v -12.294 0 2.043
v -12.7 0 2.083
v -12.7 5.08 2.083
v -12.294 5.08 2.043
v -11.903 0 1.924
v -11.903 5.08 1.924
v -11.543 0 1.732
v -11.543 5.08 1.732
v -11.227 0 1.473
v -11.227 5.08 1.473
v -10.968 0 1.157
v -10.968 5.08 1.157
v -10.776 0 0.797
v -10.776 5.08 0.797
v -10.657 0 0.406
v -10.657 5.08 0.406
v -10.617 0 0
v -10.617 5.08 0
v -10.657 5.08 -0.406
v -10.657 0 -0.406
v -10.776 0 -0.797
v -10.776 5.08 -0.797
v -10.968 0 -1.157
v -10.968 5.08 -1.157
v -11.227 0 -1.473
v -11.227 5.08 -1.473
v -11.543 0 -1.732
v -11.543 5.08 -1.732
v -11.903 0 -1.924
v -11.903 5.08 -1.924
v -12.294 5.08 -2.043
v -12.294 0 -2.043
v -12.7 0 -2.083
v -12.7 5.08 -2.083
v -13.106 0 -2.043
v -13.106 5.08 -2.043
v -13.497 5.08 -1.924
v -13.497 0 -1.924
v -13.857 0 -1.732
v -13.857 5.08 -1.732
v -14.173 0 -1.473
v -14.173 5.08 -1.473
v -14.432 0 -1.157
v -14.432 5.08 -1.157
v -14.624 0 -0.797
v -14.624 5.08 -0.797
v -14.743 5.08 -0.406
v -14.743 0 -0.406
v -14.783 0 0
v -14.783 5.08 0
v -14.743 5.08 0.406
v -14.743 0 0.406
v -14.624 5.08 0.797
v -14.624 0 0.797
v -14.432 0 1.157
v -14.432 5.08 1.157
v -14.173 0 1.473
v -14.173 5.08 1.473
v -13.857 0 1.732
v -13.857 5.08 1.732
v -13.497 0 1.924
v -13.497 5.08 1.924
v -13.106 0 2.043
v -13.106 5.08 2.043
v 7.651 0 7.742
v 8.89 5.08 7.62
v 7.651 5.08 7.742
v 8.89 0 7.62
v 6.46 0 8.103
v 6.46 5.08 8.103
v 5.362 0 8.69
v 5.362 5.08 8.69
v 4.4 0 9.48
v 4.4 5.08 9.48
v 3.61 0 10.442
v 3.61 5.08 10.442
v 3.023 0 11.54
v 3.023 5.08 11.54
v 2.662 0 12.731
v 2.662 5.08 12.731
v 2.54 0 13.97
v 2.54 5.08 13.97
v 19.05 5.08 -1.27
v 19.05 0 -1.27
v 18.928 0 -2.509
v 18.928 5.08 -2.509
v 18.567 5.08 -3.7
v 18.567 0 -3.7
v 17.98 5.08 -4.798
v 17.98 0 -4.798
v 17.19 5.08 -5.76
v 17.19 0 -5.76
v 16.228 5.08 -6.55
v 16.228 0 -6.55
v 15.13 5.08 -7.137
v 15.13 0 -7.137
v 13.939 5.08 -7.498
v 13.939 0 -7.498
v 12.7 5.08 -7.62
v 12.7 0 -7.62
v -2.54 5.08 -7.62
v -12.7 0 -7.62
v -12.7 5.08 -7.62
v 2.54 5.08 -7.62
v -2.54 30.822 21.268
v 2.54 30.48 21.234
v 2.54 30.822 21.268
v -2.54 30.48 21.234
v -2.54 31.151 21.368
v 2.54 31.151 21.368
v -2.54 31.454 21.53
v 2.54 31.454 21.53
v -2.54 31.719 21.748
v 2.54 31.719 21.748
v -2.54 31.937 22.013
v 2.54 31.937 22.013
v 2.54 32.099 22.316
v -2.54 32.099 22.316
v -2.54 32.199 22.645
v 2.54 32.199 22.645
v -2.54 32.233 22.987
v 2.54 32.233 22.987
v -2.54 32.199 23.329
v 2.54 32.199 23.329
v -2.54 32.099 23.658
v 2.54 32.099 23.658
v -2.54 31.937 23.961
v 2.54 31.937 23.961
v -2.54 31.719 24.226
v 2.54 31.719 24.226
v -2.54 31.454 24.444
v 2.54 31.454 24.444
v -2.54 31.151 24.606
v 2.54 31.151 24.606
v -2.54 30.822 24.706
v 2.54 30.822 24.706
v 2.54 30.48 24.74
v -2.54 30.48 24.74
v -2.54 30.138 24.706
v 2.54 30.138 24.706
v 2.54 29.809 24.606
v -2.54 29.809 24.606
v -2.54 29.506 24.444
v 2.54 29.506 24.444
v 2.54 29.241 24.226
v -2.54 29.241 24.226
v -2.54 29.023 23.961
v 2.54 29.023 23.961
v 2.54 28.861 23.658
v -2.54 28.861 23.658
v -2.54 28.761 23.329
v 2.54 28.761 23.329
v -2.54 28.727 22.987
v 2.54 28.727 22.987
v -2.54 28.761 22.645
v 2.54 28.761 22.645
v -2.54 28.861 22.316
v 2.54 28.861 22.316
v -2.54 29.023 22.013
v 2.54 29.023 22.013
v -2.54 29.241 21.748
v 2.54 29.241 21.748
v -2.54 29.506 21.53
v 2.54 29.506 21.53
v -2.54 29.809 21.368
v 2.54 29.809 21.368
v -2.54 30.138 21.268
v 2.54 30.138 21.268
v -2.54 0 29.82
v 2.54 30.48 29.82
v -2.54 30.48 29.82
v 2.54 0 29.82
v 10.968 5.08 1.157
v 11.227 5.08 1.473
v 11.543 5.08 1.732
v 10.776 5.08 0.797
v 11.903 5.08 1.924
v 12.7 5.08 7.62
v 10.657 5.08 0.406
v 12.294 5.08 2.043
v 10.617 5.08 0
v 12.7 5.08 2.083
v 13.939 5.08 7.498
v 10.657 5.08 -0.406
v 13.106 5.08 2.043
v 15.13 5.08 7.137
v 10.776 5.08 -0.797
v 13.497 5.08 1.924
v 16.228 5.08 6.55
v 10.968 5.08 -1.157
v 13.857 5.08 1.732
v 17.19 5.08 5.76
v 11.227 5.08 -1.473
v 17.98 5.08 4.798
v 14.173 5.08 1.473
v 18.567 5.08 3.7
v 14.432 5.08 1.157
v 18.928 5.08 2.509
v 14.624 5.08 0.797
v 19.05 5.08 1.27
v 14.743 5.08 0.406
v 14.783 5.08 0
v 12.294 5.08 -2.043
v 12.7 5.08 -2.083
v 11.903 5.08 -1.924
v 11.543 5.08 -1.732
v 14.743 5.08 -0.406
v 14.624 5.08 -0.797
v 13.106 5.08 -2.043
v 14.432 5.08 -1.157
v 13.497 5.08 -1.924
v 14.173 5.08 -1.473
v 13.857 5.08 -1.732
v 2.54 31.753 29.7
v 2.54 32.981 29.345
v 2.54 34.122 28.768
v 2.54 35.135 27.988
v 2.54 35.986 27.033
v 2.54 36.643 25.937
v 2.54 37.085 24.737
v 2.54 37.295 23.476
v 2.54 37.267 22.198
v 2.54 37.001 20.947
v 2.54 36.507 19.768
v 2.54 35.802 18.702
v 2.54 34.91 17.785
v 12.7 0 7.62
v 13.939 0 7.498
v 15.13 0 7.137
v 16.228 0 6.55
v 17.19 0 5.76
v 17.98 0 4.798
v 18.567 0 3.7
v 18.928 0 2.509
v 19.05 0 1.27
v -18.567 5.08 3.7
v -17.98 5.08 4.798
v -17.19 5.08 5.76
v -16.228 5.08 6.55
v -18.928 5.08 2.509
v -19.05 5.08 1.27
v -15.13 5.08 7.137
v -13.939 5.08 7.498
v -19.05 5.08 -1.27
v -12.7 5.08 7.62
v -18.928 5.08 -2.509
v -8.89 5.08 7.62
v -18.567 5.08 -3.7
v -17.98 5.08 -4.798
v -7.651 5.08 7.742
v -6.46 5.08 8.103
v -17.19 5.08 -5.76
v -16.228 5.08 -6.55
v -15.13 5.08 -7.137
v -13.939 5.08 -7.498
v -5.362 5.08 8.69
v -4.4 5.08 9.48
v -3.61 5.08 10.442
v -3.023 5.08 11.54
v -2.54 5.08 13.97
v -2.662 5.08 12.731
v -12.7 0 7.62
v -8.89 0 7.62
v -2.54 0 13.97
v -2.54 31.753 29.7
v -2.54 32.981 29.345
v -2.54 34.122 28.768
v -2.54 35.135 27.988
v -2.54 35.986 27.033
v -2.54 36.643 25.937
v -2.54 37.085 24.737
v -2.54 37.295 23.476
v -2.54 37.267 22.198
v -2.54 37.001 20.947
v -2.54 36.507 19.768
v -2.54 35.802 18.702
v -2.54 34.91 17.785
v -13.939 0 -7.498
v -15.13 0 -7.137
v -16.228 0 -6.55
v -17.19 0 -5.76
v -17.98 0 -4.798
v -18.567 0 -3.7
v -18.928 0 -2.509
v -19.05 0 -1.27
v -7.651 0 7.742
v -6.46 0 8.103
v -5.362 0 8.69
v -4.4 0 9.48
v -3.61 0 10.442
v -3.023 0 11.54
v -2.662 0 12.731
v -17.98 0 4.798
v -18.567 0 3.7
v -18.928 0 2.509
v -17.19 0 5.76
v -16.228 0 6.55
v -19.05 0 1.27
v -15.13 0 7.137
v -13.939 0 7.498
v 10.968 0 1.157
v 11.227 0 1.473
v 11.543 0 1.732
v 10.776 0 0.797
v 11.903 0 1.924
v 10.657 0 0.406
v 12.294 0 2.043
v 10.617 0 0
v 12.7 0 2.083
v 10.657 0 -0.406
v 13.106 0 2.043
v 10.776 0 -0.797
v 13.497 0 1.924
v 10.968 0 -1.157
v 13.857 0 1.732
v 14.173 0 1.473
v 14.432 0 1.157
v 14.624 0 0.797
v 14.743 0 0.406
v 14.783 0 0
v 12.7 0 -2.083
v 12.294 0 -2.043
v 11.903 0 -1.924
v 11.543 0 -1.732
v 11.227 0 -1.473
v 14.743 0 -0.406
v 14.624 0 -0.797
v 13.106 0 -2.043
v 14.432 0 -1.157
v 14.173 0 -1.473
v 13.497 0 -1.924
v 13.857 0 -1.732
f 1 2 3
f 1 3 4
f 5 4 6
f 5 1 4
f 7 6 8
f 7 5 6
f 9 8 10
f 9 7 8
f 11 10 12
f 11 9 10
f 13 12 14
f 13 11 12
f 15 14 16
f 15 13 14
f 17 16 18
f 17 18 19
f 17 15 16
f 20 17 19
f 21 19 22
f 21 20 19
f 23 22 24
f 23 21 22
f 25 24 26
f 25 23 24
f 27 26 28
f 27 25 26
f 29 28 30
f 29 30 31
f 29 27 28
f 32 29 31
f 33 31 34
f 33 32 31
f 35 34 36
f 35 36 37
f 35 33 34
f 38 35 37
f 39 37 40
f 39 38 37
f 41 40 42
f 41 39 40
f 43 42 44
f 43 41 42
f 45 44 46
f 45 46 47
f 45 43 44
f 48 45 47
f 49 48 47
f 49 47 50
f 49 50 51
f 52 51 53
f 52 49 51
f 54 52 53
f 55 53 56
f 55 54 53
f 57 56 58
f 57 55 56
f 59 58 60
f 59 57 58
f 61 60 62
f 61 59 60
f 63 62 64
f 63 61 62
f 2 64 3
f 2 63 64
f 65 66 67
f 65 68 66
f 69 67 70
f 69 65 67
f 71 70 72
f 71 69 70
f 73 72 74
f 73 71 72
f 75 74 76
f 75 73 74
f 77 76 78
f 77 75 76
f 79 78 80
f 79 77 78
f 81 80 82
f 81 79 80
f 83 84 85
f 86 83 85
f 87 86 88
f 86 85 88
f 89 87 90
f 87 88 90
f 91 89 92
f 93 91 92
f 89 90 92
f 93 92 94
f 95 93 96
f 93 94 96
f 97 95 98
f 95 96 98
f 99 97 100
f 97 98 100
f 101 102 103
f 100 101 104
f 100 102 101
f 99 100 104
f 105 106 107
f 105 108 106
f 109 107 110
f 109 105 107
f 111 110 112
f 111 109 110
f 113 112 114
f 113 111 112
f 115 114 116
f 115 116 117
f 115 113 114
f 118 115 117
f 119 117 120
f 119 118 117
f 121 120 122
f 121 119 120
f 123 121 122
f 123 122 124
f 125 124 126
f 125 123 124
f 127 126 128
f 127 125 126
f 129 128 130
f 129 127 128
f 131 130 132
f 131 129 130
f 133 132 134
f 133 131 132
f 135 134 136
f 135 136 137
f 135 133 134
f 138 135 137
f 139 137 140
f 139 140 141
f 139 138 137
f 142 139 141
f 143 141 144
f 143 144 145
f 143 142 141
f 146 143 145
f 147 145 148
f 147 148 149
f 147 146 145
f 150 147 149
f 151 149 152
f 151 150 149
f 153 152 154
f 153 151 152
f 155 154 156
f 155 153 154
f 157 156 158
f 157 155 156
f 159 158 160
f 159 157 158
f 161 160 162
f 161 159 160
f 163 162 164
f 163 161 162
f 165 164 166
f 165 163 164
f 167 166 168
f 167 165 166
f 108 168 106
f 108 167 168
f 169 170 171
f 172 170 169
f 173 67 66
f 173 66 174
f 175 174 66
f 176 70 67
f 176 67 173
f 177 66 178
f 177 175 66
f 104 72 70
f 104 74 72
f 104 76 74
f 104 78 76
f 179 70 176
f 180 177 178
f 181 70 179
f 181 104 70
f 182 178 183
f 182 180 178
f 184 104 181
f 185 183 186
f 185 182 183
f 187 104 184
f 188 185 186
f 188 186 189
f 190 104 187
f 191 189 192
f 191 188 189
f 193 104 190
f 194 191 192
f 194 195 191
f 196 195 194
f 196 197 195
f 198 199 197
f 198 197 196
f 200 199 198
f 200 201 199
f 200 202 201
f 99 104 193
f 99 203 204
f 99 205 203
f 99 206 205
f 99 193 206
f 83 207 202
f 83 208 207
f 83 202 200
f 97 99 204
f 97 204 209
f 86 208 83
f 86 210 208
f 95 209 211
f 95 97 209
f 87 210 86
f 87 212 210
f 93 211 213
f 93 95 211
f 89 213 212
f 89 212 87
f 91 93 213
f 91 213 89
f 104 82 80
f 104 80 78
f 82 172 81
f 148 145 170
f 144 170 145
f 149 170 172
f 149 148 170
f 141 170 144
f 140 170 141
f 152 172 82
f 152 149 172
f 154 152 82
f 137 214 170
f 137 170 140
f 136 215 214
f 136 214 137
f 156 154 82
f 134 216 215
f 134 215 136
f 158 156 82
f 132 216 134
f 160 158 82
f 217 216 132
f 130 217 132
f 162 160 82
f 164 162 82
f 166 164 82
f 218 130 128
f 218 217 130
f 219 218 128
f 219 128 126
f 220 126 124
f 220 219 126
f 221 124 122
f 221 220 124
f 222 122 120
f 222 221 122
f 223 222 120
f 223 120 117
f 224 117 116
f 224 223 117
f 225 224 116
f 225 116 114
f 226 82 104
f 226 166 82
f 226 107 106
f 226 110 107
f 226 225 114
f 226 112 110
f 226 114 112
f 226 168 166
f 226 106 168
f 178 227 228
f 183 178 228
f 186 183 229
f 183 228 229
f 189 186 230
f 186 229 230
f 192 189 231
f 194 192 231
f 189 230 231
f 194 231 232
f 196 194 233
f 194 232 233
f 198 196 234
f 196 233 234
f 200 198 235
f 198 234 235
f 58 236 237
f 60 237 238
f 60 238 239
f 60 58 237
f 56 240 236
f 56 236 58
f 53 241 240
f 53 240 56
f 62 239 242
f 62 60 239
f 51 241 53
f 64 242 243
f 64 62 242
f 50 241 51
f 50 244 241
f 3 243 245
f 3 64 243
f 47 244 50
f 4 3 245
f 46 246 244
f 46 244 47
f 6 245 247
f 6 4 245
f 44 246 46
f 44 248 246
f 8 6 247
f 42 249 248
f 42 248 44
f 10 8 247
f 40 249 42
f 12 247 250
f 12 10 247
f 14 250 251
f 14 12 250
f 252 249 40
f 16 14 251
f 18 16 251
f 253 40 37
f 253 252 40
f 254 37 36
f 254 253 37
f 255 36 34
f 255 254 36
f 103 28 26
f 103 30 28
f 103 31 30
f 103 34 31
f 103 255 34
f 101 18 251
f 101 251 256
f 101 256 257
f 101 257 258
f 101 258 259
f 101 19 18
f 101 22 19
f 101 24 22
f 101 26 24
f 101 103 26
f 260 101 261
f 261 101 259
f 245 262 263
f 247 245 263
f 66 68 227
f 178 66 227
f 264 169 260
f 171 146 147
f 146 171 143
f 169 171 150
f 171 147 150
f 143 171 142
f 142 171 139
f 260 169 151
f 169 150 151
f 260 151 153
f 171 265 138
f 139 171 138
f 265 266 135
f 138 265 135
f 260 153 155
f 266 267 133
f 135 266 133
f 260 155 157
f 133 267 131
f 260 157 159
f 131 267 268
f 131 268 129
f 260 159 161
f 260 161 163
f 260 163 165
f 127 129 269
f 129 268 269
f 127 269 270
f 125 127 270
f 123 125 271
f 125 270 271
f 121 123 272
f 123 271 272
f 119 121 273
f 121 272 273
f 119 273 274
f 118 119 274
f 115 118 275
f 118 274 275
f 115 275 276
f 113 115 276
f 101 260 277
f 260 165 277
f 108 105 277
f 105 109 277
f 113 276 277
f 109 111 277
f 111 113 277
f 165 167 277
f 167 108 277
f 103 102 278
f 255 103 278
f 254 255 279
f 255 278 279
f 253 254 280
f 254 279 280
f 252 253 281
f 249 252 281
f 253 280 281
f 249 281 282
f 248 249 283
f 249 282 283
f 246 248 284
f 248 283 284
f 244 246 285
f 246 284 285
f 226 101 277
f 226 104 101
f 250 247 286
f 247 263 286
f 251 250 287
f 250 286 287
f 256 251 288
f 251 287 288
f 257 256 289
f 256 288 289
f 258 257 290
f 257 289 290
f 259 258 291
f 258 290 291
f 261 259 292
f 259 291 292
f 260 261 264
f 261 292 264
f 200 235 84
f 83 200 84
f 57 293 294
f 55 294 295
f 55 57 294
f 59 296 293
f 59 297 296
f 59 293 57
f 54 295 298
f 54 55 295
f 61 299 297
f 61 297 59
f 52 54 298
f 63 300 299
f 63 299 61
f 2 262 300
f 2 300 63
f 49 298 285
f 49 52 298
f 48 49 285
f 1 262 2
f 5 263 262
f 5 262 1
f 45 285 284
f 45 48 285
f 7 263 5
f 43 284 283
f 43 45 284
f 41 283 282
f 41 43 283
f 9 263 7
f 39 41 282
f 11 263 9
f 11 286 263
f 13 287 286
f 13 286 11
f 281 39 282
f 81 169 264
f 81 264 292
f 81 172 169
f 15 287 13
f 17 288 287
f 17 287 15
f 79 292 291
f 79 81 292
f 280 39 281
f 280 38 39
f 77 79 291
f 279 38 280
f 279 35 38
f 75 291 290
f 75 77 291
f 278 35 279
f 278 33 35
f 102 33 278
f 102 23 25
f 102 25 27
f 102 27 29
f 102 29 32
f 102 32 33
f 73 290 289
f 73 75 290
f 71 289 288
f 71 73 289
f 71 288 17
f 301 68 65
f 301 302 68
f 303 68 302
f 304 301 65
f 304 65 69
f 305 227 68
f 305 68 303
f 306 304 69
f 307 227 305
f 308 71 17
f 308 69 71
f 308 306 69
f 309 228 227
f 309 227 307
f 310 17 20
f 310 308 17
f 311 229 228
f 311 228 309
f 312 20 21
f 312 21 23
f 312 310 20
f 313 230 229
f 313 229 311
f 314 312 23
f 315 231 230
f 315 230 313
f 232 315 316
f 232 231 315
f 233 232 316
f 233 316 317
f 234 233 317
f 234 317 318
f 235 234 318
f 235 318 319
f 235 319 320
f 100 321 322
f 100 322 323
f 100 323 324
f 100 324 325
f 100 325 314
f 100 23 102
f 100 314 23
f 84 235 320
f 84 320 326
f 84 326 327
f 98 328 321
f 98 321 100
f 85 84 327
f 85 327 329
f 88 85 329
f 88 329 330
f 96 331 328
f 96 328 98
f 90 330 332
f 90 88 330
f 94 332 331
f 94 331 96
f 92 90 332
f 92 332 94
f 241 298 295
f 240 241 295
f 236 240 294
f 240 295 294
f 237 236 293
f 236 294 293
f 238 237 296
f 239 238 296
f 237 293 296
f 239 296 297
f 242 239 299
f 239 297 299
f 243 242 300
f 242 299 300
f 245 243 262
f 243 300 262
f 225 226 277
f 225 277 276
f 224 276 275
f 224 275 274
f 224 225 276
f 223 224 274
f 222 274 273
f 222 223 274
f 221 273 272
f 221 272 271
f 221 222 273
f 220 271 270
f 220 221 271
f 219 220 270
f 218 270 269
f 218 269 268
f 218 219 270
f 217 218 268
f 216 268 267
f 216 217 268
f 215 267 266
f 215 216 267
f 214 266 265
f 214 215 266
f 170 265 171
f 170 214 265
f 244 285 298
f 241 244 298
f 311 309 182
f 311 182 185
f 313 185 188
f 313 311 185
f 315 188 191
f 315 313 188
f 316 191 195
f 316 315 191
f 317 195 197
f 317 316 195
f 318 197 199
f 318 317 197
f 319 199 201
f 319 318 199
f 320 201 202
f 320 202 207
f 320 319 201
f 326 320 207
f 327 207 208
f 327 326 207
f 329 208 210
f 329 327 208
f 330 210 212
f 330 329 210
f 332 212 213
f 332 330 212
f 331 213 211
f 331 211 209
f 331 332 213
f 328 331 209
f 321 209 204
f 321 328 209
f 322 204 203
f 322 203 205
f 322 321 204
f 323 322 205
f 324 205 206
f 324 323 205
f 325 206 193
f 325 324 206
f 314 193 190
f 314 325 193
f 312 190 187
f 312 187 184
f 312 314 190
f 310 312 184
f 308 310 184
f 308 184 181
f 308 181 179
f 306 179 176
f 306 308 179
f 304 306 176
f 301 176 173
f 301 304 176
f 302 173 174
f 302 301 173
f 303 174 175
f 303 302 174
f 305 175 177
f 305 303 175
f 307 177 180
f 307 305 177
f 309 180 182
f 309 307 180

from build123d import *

# Parameters (mm, degrees)
SKETCH1_R           = 2.0828
BOSS_EXTRUDE1_DEPTH = 5.08
SKETCH2_R           = 1.7526
BOSS_EXTRUDE2_DEPTH = 2.54
FILLET1_R           = 6.35


with BuildPart() as part:
    # Sketch1 → Boss-Extrude1 (new body)
    with BuildSketch(Plane(origin=(0, 0, 0), x_dir=(1, 0, 0), z_dir=(0, 1, 0))):
        with BuildLine():
            Line((-12.7, -7.62), (12.7, -7.62))
            ThreePointArc((12.7, -7.62), (17.190128061, -5.760128061), (19.05, -1.27))
            Line((19.05, -1.27), (19.05, 1.27))
            ThreePointArc((19.05, 1.27), (17.190128061, 5.760128061), (12.7, 7.62))
            Line((12.7, 7.62), (-12.7, 7.62))
            ThreePointArc((-12.7, 7.62), (-17.190128061, 5.760128061), (-19.05, 1.27))
            Line((-19.05, 1.27), (-19.05, -1.27))
            ThreePointArc((-19.05, -1.27), (-17.190128061, -5.760128061), (-12.7, -7.62))
        make_face()
        with Locations(Location((-12.7, 0, 0), (0, 0, 270))):
            Circle(SKETCH1_R, mode=Mode.SUBTRACT)
        with Locations(Location((12.7, 0, 0), (0, 0, 270))):
            Circle(SKETCH1_R, mode=Mode.SUBTRACT)
    extrude(amount=BOSS_EXTRUDE1_DEPTH)

    # Sketch2 → Boss-Extrude2 (add, symmetric)
    with BuildSketch(Plane(origin=(0, 0, 0), x_dir=(0, 0, -1), z_dir=(1, 0, 0))):
        with BuildLine():
            Line((7.62, 5.08), (-17.785245966, 34.910144211))
            ThreePointArc((-17.785245966, 34.910144211), (-25.347393839, 36.891939152), (-29.8196, 30.48))
            Line((-29.8196, 30.48), (-29.8196, 0))
            Line((-29.8196, 0), (7.62, 0))
            Line((7.62, 0), (7.62, 5.08))
        make_face()
        with Locations((-22.987, 30.48)):
            Circle(SKETCH2_R, mode=Mode.SUBTRACT)
    extrude(amount=BOSS_EXTRUDE2_DEPTH, both=True)

    # Fillet1
    fillet1_edges = [part.edges().sort_by_distance(p)[0] for p in [
        (-2.54, 2.54, 7.62),
        (2.54, 2.54, 7.62),
    ]]
    fillet(fillet1_edges, radius=FILLET1_R)


solid = part.part
